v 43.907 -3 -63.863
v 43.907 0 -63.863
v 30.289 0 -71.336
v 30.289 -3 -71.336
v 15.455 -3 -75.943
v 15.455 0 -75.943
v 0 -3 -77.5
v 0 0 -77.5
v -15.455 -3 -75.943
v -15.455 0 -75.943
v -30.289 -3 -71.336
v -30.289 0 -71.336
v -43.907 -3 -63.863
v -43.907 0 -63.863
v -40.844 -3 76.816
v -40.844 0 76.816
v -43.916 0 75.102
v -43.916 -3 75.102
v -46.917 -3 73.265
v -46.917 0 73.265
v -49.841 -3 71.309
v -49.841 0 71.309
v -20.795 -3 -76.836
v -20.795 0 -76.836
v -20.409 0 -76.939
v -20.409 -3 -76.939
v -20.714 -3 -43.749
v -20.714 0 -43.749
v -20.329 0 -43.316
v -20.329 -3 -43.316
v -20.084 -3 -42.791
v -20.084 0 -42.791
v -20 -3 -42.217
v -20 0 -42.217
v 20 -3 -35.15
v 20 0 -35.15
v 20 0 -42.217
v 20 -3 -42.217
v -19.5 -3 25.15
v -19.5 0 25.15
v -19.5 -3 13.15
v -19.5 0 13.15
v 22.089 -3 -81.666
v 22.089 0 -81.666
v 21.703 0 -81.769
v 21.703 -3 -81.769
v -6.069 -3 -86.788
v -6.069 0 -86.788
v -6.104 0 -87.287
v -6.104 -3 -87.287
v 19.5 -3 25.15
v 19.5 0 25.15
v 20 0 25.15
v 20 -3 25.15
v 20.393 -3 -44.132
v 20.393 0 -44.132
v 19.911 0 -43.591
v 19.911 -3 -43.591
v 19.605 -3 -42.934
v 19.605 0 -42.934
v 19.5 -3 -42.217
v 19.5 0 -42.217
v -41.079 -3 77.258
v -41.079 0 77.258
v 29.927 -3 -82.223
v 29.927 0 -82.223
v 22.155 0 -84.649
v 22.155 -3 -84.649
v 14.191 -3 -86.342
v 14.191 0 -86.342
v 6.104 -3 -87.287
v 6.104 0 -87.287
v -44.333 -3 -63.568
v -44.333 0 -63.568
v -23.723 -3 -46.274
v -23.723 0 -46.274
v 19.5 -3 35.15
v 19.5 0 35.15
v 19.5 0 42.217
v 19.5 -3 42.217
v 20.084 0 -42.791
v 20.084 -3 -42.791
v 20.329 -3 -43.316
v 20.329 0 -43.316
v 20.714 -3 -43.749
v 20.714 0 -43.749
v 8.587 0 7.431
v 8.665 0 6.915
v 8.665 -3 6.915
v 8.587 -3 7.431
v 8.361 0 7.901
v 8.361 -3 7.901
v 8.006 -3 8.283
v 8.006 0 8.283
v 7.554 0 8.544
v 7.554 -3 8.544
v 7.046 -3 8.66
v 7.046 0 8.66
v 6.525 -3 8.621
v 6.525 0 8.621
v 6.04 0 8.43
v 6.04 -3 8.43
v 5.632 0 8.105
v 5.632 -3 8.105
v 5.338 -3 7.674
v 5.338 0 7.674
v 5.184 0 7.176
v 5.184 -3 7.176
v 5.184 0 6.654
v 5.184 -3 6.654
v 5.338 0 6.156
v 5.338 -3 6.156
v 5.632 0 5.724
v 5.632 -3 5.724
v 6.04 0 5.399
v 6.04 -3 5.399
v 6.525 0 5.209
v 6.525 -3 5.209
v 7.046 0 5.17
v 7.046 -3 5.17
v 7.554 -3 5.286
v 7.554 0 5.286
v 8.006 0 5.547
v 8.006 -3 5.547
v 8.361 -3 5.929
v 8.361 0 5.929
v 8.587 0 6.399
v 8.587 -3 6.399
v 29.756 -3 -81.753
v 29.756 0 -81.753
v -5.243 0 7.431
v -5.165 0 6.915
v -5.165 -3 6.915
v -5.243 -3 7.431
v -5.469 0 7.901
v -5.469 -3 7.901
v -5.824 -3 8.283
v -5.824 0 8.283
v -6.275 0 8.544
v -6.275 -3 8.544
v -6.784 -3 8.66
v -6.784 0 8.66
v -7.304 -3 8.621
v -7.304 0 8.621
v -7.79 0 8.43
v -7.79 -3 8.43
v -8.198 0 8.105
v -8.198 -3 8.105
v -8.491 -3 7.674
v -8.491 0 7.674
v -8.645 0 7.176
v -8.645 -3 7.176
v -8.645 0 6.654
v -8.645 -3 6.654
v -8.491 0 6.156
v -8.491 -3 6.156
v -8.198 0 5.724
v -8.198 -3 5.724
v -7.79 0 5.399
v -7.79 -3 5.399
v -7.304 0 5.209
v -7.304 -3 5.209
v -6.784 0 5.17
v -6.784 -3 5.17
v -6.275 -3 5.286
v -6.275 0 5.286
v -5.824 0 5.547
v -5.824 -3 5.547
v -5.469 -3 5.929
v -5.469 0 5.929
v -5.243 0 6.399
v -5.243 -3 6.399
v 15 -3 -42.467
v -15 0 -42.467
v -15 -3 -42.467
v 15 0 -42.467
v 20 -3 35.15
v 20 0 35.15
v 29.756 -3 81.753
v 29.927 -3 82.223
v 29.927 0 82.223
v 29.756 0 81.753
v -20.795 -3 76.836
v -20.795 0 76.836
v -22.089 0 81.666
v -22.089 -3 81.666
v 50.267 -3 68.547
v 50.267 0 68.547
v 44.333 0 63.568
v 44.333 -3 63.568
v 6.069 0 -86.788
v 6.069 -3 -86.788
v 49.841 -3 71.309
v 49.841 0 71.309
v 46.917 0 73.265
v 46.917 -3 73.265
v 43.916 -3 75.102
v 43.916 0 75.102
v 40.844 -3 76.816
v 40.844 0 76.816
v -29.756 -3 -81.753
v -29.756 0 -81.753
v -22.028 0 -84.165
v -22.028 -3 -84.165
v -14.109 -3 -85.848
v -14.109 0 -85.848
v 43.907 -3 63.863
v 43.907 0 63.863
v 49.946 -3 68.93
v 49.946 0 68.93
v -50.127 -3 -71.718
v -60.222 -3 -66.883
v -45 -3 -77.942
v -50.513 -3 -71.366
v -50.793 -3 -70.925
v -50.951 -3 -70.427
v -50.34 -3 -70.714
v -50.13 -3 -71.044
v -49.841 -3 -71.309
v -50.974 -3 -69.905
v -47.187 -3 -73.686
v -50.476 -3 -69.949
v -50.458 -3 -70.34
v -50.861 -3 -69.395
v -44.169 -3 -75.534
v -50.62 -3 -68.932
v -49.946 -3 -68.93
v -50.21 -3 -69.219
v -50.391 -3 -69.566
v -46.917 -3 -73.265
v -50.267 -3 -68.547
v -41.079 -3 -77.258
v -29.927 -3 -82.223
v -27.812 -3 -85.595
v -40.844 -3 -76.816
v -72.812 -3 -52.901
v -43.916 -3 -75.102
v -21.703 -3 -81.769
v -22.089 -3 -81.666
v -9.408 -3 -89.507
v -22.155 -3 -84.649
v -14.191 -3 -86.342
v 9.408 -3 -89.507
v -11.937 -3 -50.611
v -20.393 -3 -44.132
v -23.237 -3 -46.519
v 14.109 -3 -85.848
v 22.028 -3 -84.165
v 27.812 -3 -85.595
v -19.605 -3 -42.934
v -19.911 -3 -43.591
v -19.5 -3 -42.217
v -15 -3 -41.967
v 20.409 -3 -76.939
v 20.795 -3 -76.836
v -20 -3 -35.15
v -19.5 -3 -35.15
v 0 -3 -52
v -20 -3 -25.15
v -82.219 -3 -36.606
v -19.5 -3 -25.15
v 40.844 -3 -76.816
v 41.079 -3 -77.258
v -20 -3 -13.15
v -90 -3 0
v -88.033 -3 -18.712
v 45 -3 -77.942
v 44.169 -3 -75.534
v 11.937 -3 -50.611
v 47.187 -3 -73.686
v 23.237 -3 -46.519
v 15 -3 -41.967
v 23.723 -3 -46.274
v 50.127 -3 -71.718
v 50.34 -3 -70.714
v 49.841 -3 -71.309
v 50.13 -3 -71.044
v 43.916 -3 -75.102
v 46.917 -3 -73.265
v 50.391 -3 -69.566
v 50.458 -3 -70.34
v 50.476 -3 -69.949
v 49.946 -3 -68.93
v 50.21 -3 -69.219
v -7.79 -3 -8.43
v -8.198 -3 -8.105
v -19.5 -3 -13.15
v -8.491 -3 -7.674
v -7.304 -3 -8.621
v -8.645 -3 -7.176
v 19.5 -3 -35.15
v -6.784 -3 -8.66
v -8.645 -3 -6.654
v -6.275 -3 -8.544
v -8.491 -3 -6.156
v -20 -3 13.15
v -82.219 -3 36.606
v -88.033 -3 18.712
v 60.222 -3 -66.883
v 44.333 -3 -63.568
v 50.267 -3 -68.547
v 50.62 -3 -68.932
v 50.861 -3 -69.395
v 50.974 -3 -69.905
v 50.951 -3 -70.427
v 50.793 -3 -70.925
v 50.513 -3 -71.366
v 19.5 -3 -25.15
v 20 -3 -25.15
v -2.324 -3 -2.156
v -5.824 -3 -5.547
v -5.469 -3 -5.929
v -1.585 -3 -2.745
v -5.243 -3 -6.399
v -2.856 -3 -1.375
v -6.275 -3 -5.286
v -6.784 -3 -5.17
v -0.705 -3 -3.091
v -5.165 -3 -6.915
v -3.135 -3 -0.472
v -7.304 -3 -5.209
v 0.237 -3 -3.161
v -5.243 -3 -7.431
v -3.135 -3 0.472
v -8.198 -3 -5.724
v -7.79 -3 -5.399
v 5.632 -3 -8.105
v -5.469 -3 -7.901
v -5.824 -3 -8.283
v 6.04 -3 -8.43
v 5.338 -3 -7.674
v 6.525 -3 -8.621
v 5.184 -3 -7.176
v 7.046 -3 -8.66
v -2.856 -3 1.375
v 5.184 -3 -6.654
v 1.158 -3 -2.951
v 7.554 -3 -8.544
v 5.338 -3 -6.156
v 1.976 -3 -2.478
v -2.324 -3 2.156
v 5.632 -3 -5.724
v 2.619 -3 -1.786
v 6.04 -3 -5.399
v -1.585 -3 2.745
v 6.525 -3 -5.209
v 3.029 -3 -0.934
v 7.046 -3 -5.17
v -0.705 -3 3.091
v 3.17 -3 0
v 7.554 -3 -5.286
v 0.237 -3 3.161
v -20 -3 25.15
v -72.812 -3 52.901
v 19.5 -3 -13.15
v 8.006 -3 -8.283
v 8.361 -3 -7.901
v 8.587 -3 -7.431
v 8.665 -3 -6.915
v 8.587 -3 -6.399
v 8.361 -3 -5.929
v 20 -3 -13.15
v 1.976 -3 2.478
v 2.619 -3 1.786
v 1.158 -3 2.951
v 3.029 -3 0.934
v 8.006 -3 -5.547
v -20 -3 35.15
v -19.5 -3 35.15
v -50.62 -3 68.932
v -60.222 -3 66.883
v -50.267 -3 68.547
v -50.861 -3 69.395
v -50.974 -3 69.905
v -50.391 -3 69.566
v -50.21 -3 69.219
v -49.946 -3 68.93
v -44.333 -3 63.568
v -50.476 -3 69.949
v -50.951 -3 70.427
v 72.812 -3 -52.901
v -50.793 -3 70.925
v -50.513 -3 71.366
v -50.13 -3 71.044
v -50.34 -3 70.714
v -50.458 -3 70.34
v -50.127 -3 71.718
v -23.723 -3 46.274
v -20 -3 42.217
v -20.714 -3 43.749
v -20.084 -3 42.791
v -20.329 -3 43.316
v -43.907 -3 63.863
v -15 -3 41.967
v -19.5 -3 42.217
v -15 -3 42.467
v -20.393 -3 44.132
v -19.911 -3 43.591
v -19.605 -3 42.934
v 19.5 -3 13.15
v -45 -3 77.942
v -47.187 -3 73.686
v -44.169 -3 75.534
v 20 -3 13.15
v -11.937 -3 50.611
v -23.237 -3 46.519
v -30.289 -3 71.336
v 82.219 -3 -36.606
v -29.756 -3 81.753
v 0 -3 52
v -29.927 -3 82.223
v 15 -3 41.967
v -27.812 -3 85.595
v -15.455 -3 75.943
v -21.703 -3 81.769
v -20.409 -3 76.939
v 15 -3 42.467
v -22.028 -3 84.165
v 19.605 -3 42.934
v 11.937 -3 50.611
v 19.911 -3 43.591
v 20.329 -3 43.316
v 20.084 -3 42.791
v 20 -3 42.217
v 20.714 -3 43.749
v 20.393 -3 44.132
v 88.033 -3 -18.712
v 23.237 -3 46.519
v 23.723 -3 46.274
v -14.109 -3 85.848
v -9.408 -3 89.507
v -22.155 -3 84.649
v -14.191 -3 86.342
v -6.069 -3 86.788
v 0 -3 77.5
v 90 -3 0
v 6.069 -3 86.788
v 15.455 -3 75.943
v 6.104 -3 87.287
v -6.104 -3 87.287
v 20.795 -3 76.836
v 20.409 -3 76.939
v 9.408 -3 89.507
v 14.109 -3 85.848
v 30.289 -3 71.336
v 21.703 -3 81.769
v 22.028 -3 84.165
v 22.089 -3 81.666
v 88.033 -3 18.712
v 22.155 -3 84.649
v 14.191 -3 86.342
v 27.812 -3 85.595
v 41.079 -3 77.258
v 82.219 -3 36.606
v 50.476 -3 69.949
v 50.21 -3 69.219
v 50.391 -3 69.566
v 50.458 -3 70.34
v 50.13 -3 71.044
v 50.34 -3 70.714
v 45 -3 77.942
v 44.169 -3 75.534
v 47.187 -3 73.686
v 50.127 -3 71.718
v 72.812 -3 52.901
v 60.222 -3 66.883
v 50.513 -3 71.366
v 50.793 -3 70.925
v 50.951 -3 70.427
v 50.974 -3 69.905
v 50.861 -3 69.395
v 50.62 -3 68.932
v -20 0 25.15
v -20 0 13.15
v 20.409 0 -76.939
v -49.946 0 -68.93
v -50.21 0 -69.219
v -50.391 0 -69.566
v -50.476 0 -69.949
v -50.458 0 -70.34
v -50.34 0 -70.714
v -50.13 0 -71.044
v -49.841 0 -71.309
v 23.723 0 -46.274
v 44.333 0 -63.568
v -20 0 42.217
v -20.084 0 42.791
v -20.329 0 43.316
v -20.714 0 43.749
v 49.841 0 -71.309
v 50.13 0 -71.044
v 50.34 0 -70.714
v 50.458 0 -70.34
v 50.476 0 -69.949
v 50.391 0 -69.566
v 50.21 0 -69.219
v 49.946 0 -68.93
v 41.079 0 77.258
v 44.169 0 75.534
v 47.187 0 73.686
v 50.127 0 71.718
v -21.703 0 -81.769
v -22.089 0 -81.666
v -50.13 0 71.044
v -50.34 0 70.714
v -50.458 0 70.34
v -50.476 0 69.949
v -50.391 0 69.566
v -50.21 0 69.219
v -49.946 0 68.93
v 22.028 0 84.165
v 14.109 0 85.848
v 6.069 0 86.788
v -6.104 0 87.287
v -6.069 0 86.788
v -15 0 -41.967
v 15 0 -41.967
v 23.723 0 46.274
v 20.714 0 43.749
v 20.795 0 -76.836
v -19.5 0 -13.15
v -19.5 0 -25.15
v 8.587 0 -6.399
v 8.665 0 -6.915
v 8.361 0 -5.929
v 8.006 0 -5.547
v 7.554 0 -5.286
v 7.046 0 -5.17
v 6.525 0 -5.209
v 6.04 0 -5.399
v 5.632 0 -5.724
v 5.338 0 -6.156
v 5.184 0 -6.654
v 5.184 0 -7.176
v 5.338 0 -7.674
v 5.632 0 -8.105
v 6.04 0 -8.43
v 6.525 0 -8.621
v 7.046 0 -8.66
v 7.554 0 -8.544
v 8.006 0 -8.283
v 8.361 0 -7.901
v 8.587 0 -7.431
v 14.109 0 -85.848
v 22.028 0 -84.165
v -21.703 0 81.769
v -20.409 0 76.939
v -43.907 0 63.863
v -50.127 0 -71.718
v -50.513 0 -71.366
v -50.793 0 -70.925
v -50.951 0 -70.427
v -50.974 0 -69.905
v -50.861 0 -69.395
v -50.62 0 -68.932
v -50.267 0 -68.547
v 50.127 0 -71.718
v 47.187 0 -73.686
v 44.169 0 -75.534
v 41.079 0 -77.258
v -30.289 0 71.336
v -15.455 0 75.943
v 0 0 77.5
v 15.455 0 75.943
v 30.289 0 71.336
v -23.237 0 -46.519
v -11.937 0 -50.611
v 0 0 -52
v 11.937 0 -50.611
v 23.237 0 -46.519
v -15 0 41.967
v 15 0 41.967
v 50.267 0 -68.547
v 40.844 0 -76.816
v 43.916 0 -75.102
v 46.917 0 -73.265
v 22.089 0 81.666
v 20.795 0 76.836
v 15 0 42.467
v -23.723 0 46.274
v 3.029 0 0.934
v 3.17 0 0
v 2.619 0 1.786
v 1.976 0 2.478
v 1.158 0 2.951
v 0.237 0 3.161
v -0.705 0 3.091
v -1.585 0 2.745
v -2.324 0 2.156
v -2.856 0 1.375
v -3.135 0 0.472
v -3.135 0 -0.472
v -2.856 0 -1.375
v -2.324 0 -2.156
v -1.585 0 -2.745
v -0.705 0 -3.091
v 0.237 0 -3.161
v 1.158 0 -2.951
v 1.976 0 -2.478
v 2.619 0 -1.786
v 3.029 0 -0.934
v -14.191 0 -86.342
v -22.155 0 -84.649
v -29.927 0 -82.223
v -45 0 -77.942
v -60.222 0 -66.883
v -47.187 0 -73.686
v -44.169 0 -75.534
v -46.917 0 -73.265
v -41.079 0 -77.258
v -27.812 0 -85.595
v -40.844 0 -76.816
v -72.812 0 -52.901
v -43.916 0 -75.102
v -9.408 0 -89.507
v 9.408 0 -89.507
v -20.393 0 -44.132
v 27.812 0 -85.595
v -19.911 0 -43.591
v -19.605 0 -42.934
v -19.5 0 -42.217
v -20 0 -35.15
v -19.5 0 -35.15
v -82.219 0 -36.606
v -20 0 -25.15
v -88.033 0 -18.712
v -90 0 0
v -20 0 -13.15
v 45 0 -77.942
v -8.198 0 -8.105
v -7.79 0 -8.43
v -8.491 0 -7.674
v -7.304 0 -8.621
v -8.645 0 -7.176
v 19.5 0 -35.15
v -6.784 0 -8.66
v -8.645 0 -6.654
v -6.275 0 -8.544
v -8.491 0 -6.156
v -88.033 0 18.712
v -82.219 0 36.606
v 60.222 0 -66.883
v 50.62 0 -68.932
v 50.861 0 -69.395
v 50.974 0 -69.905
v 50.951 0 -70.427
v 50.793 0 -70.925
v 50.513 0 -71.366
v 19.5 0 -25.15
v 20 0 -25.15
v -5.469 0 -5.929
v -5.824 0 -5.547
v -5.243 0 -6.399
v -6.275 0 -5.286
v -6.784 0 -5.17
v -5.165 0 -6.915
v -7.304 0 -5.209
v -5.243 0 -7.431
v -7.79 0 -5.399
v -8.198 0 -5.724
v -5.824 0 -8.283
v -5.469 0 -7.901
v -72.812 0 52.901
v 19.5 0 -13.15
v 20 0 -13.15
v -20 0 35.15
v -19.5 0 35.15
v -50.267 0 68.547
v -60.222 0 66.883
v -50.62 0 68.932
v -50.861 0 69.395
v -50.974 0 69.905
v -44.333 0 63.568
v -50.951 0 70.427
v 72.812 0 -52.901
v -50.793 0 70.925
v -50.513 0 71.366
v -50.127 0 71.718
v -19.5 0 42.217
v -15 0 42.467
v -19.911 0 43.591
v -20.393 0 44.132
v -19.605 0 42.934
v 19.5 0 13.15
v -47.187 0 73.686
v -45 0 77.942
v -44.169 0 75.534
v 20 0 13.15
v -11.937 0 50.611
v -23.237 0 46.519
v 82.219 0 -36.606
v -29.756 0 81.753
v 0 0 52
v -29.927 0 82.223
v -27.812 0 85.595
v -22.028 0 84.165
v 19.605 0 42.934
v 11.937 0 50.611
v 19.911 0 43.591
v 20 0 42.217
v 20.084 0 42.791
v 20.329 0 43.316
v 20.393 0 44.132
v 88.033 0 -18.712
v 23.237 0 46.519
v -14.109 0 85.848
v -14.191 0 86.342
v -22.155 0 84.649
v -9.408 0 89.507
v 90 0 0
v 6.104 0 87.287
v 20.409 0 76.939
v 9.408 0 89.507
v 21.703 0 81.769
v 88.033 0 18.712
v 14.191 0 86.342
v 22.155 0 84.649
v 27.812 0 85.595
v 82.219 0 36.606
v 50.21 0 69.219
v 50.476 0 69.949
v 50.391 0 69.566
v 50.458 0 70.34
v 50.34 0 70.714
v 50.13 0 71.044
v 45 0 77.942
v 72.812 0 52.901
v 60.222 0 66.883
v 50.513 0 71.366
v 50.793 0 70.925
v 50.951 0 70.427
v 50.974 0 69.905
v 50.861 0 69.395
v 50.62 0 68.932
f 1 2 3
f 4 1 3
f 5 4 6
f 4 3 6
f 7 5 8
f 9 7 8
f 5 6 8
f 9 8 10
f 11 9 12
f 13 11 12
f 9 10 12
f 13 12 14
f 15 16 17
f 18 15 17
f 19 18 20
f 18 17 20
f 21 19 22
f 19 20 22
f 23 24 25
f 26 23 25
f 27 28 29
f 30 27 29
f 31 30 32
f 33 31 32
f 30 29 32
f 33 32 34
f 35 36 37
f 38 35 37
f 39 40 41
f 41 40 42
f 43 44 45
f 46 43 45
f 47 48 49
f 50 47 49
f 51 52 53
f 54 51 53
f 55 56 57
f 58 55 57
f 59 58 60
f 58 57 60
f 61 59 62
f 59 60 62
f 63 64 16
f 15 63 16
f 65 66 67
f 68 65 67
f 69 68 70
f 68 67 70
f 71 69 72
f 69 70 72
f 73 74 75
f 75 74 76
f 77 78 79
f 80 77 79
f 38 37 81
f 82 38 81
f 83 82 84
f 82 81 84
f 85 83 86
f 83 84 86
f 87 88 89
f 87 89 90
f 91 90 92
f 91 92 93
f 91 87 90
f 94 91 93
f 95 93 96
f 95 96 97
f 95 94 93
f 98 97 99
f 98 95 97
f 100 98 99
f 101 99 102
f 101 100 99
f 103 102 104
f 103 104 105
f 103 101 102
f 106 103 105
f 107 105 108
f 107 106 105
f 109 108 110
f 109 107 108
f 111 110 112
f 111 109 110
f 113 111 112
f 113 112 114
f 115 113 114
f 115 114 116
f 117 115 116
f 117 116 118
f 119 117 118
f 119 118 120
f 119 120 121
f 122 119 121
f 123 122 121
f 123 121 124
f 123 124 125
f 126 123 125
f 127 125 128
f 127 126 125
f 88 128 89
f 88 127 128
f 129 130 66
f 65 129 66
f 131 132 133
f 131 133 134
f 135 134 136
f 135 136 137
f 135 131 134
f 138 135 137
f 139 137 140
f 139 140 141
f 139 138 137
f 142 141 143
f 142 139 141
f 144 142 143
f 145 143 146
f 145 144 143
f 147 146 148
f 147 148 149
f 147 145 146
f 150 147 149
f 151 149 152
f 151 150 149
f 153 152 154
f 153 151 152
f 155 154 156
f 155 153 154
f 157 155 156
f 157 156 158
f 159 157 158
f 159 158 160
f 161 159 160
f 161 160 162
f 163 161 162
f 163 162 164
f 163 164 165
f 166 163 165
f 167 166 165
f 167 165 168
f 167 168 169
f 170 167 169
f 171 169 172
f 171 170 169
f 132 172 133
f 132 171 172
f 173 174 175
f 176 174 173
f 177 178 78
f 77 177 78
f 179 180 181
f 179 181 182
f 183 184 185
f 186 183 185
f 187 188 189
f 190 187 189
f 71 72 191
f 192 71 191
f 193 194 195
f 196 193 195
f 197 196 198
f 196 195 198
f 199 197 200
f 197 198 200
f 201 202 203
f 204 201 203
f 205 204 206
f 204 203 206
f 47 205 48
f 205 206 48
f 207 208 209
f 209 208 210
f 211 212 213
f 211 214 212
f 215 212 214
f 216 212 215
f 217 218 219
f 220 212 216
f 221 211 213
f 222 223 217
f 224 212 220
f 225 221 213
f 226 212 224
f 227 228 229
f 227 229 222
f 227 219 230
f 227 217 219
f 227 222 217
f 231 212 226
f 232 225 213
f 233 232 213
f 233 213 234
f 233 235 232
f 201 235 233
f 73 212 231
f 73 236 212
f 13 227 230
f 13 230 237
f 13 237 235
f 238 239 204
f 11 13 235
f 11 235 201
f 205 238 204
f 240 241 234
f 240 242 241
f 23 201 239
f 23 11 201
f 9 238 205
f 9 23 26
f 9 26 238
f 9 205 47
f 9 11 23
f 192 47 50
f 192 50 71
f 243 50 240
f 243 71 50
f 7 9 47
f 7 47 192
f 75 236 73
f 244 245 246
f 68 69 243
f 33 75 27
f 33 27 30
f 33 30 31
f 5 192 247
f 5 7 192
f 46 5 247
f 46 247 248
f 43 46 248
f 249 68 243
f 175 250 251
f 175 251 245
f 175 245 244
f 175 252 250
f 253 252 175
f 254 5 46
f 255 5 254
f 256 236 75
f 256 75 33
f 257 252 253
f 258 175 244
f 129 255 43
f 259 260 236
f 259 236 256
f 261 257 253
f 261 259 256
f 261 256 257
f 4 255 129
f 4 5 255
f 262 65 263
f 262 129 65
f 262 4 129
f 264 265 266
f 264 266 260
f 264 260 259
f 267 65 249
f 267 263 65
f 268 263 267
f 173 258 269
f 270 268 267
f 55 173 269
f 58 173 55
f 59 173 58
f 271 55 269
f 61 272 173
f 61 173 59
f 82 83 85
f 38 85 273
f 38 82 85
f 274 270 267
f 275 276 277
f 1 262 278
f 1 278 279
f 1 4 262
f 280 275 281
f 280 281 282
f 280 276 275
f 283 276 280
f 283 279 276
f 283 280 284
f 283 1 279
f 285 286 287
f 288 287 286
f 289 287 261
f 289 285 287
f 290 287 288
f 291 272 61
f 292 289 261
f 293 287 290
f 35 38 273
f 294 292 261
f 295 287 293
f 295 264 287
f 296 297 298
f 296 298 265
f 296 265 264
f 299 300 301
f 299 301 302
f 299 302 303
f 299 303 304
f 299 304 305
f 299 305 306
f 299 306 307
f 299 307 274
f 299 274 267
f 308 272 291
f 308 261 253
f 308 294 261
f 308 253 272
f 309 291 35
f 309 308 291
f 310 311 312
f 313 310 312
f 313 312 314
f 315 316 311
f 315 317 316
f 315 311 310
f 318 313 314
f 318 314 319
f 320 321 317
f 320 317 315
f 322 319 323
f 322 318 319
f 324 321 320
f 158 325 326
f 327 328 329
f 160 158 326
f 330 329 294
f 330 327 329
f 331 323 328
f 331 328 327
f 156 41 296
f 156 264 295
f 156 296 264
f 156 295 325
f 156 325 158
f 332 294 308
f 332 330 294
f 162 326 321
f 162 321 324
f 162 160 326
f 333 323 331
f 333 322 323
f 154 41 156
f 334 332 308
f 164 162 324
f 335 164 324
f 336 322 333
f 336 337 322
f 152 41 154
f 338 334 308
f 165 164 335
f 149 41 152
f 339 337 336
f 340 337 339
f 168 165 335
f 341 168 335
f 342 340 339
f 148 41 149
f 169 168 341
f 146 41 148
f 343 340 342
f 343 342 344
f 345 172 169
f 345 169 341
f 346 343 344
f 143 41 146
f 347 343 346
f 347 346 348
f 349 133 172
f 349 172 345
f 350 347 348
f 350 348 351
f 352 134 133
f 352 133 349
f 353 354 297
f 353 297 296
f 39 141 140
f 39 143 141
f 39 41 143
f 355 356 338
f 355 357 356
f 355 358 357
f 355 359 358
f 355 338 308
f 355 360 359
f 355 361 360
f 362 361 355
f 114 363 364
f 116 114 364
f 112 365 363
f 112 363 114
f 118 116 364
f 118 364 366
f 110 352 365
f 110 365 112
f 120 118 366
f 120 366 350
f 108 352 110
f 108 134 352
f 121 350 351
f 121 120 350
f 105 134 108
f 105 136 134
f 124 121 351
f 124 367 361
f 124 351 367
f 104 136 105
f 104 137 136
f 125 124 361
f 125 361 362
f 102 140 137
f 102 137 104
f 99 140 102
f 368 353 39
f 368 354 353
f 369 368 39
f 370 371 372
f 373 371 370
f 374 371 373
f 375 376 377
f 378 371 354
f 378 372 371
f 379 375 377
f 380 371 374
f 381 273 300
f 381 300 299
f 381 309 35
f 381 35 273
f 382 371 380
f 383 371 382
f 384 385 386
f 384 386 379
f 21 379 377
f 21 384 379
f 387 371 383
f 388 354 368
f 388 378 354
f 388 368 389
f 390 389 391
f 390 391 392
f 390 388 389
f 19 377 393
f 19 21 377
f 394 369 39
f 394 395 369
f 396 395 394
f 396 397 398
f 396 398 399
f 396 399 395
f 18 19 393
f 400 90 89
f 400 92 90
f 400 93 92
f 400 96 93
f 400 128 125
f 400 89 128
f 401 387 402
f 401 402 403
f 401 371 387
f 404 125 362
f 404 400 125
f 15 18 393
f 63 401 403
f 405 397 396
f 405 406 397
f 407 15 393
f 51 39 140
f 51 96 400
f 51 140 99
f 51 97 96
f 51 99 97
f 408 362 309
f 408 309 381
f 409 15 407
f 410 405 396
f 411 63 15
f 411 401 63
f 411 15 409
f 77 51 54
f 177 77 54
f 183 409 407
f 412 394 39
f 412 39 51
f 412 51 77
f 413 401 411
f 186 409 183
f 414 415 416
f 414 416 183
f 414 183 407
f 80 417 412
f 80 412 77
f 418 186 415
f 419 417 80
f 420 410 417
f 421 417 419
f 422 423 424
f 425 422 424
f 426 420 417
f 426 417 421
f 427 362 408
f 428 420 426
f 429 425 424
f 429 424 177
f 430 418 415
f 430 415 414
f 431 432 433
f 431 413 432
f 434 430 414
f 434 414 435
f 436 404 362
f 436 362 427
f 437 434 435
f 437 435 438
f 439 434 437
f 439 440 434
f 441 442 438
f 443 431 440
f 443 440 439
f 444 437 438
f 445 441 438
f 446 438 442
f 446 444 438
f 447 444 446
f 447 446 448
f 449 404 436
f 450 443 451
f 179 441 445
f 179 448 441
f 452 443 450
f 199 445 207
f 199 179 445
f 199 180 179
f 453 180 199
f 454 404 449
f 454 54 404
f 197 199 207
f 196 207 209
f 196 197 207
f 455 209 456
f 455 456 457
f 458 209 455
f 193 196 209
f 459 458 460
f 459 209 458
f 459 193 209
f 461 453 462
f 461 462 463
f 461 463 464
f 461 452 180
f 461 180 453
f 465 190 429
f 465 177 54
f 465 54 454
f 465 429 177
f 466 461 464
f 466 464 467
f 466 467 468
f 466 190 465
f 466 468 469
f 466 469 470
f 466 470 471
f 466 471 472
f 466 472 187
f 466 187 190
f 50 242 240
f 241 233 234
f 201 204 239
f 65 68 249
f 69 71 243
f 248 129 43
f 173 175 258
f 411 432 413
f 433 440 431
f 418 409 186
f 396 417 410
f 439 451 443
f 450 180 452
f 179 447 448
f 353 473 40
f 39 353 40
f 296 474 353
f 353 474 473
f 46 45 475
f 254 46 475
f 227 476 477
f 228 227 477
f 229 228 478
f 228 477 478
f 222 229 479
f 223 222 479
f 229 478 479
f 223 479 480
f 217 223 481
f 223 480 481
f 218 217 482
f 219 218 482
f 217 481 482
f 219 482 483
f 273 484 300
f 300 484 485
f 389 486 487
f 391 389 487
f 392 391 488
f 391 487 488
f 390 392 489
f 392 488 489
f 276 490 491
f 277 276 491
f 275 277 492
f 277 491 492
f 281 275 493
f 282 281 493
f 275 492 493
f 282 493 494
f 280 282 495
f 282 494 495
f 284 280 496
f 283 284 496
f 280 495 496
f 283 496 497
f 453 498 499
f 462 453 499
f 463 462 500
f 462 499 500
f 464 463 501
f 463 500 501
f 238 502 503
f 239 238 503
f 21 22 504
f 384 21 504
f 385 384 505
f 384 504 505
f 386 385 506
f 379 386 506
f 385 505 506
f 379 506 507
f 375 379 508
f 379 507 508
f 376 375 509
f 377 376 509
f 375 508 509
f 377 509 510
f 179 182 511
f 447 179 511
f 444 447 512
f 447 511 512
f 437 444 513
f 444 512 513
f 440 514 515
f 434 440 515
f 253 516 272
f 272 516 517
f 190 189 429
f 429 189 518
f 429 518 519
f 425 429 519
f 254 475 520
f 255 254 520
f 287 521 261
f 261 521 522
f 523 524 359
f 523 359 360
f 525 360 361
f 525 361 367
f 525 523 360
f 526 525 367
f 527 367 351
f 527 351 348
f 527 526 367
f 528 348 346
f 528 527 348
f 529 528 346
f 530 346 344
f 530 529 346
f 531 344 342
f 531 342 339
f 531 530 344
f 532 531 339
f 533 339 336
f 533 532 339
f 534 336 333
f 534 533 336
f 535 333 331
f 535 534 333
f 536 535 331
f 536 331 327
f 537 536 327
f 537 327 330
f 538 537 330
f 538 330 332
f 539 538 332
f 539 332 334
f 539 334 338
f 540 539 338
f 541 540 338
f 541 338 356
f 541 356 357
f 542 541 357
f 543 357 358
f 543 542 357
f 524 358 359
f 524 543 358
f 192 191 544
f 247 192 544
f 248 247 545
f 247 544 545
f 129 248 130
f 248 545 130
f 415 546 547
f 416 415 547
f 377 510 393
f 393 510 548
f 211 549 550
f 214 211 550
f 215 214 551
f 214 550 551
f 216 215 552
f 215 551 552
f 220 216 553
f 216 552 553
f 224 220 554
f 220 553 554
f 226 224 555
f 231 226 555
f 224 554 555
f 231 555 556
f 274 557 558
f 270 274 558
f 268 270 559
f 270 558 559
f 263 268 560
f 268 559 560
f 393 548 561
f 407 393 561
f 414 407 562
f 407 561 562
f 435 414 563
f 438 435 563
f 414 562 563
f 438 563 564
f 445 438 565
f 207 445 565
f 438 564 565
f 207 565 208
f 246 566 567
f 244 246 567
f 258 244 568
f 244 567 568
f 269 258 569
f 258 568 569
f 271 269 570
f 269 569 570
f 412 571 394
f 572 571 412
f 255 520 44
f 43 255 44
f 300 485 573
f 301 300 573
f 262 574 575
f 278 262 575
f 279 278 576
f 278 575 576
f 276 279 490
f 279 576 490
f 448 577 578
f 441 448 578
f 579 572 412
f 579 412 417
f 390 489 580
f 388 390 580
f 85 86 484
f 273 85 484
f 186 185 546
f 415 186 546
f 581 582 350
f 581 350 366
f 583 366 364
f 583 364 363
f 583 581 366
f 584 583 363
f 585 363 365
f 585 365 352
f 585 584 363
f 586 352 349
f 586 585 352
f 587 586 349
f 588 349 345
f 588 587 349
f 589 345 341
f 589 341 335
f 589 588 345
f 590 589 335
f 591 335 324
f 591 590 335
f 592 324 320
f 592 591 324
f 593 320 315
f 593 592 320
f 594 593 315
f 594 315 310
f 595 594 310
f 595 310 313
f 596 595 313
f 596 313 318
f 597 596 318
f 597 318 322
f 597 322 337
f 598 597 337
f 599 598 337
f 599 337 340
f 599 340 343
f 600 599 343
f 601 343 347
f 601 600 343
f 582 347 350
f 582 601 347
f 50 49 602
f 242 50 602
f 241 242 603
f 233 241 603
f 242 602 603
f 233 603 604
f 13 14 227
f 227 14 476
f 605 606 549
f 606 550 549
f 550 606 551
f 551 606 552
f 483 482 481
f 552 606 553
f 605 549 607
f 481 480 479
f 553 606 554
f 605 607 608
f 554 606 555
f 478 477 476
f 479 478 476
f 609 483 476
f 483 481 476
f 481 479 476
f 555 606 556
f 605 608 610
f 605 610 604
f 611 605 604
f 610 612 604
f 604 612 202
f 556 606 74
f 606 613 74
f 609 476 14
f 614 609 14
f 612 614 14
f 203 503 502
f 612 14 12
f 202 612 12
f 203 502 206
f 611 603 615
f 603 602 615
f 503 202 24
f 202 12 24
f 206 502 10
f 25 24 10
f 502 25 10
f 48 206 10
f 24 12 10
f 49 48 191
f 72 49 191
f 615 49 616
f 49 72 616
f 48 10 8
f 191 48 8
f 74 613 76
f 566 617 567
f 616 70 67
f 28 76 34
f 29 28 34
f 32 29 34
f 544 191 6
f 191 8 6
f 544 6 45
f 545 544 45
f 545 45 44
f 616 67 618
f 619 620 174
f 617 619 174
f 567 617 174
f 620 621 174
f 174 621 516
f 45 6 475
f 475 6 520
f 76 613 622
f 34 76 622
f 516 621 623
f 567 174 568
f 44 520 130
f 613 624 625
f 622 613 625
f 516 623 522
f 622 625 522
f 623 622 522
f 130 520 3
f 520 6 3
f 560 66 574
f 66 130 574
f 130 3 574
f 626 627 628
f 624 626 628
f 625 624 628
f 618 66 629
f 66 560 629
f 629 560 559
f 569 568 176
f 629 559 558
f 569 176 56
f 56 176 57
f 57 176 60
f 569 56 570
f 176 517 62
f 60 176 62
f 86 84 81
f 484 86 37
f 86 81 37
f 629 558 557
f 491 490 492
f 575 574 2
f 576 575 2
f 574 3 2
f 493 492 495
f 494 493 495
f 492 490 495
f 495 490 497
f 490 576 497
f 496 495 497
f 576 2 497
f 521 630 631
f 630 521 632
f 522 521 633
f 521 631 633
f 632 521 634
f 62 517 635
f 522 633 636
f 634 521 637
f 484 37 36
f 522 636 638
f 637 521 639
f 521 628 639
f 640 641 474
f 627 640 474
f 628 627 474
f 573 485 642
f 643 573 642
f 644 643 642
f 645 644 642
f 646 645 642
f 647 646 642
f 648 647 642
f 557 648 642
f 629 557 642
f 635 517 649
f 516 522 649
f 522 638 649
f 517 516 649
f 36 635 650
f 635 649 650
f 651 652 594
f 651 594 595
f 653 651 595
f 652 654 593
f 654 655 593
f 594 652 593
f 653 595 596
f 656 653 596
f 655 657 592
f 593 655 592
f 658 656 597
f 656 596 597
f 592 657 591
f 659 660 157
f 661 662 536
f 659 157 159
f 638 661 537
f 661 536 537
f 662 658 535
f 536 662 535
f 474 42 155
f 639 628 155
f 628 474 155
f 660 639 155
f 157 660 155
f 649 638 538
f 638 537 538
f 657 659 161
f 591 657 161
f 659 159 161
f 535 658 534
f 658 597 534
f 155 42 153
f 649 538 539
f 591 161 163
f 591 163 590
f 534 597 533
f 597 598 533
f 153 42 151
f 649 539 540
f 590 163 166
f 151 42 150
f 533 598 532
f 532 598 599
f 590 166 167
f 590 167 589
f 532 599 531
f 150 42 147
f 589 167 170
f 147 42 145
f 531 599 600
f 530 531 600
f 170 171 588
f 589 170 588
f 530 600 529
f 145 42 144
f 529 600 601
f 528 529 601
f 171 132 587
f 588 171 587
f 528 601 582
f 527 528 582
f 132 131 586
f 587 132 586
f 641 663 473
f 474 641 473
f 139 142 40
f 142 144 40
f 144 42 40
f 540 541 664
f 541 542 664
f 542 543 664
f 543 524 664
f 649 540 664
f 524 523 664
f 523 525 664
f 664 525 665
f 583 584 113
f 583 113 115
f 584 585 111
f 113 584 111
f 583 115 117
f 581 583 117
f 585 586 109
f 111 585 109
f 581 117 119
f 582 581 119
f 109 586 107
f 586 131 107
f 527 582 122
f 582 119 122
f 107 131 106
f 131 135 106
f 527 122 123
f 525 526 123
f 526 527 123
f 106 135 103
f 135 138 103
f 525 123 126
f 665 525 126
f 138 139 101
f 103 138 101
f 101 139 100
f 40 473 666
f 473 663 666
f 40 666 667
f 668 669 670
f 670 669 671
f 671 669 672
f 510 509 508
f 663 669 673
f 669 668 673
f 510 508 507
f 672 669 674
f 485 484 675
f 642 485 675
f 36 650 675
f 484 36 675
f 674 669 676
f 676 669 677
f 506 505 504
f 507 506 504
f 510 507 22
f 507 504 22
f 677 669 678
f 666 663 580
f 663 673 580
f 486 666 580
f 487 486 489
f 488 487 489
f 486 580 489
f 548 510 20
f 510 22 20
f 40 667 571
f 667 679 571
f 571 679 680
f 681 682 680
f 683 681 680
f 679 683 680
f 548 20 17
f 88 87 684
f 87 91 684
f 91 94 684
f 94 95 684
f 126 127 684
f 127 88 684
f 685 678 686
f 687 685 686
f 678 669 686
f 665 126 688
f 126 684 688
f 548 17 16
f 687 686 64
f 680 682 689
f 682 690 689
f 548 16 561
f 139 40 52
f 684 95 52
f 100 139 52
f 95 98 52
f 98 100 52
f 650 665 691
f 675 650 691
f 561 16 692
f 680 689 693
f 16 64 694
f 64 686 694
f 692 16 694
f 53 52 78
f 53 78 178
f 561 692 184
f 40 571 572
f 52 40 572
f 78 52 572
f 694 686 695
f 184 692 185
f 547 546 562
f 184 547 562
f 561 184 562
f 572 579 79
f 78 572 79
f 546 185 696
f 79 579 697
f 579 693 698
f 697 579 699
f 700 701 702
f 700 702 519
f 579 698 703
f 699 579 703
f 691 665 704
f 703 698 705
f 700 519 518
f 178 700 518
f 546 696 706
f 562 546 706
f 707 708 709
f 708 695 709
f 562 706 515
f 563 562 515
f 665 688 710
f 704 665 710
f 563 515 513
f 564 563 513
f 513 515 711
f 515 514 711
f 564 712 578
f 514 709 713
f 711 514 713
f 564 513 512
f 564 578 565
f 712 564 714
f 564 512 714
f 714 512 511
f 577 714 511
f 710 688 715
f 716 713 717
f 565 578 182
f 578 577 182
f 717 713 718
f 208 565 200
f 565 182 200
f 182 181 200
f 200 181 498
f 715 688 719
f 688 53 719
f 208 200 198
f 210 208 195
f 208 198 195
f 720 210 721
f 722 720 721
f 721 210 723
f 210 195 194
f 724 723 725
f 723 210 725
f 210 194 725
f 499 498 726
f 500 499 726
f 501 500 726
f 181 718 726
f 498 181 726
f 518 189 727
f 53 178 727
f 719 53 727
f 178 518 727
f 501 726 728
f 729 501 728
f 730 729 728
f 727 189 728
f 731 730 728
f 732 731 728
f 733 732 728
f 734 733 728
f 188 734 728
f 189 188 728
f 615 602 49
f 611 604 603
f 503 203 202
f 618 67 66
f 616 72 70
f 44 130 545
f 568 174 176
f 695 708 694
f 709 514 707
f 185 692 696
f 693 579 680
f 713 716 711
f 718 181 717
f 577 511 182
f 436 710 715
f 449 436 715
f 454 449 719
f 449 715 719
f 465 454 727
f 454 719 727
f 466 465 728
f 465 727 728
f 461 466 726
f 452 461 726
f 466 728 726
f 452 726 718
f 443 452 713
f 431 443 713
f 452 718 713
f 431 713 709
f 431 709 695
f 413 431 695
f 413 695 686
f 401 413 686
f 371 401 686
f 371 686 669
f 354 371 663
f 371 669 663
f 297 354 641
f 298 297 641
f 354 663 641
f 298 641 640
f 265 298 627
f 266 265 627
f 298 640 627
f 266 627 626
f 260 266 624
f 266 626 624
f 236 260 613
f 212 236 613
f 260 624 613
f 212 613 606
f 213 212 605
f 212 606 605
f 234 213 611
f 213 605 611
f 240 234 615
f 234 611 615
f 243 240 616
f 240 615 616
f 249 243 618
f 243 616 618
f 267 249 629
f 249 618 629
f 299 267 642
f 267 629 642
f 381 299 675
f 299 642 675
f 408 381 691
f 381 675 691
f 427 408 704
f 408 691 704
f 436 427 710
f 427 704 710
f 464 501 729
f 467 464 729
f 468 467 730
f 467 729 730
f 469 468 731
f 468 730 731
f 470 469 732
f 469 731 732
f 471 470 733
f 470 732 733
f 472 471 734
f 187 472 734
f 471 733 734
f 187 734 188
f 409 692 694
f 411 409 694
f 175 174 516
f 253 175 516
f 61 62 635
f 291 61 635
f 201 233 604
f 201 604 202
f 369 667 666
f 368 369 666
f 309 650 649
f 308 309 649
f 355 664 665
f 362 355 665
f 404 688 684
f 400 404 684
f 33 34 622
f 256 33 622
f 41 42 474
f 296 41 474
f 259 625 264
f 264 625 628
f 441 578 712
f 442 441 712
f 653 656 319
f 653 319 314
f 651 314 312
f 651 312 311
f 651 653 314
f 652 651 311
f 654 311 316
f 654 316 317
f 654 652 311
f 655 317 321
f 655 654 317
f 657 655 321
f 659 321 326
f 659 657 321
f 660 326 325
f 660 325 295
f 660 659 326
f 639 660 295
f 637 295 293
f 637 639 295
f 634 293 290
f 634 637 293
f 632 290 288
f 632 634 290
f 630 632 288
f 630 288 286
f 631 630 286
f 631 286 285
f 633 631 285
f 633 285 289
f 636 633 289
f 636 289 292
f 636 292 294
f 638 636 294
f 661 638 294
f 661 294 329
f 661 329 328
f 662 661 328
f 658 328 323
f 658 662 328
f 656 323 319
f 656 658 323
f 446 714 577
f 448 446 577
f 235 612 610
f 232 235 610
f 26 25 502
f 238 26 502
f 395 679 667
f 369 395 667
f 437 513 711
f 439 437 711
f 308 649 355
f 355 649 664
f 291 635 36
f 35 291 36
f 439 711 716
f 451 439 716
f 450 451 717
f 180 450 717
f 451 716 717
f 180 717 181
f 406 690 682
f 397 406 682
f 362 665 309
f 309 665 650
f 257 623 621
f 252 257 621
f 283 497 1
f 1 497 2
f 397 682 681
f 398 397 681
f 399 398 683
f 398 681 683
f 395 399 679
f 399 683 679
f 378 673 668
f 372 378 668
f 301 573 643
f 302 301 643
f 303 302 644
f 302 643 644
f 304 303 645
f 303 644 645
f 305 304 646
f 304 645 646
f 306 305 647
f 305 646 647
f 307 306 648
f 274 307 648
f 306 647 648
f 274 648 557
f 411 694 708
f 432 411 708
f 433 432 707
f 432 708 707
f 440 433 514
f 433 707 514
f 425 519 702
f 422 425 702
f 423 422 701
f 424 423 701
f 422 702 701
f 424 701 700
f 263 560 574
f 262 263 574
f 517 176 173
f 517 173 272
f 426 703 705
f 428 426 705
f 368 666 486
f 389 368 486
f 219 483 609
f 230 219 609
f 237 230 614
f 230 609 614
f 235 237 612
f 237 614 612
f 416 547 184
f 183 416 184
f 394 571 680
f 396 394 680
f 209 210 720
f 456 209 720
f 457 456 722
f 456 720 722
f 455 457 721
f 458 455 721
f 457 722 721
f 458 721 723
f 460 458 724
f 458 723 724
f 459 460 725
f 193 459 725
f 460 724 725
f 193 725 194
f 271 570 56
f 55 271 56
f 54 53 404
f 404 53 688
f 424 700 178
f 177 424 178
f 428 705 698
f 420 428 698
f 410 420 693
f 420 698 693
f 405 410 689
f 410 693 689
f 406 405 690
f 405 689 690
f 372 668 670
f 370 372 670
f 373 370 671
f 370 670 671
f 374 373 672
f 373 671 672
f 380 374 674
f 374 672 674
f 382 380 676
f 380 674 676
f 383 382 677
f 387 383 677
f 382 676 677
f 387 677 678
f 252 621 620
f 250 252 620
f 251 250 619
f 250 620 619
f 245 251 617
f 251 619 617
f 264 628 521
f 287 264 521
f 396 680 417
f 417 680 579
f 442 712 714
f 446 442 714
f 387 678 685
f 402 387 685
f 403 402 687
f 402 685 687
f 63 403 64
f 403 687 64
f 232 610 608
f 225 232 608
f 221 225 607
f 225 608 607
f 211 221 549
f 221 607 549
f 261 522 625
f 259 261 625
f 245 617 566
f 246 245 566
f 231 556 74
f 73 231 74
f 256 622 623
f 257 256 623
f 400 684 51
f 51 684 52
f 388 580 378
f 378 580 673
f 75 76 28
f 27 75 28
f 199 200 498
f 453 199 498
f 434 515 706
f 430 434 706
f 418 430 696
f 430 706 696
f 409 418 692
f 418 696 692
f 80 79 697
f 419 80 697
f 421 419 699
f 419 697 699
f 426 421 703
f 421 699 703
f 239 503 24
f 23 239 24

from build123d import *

# Parameters (mm, degrees)
F0_R     = 90
F0_R_2   = 1.75
F0_W     = 30
F0_H     = 0.5
F0_R_3   = 3.17
F1_DEPTH = 3


with BuildPart() as f1:
    # F0 (on Front) → F1 (new body)
    with BuildSketch(Plane.XZ):
        Circle(F0_R)
        with BuildLine():
            Line((-29.926763, -82.223104), (-29.755752, -81.753258))
            ThreePointArc((-29.755752, -81.753258), (-18.088317, -85.098841), (-6.068813, -86.788072))
            Line((-6.068813, -86.788072), (-6.103691, -87.286854))
            ThreePointArc((-6.103691, -87.286854), (-18.192273, -85.587915), (-29.926763, -82.223104))
        make_face(mode=Mode.SUBTRACT)
        Polygon((-20.795181, -76.835932), (-20.408811, -76.93946), (-21.702906, -81.769089), (-22.089276, -81.665561), align=None, mode=Mode.SUBTRACT)
        Polygon((-19.5, -25.15), (-20, -25.15), (-20, -15.15), (-20, -13.15), (-19.5, -13.15), (-19.5, -15.15), align=None, mode=Mode.SUBTRACT)
        with Locations((-6.914797, -6.914797)):
            Circle(F0_R_2, mode=Mode.SUBTRACT)
        with BuildLine():
            Line((6.103691, -87.286854), (6.068813, -86.788072))
            ThreePointArc((6.068813, -86.788072), (18.088317, -85.098841), (29.755752, -81.753258))
            Line((29.755752, -81.753258), (29.926763, -82.223104))
            ThreePointArc((29.926763, -82.223104), (18.192273, -85.587915), (6.103691, -87.286854))
        make_face(mode=Mode.SUBTRACT)
        Polygon((22.089276, -81.665561), (21.702906, -81.769089), (20.408811, -76.93946), (20.795181, -76.835932), align=None, mode=Mode.SUBTRACT)
        with BuildLine():
            ThreePointArc((-41.078762, -77.257914), (-45.686982, -74.625396), (-50.127129, -71.718345))
            ThreePointArc((-50.127129, -71.718345), (-50.979425, -70.167154), (-50.266941, -68.546979))
            Line((-50.266941, -68.546979), (-44.332839, -63.567676))
            Line((-44.332839, -63.567676), (-23.722514, -46.27356))
            Line((-23.722514, -46.27356), (-20.714425, -43.749474))
            ThreePointArc((-20.714425, -43.749474), (-20.187384, -43.062621), (-20, -42.217385))
            Line((-20, -42.217385), (-20, -35.15))
            Line((-20, -35.15), (-19.5, -35.15))
            Line((-19.5, -35.15), (-19.5, -42.217385))
            ThreePointArc((-19.5, -42.217385), (-19.734231, -43.27393), (-20.393031, -44.132496))
            Line((-20.393031, -44.132496), (-23.237294, -46.519116))
            ThreePointArc((-23.237294, -46.519116), (0, -52), (23.237294, -46.519116))
            Line((23.237294, -46.519116), (20.393031, -44.132496))
            ThreePointArc((20.393031, -44.132496), (19.734231, -43.27393), (19.5, -42.217385))
            Line((19.5, -42.217385), (19.5, -35.15))
            Line((19.5, -35.15), (20, -35.15))
            Line((20, -35.15), (20, -42.217385))
            ThreePointArc((20, -42.217385), (20.187384, -43.062621), (20.714425, -43.749474))
            Line((20.714425, -43.749474), (23.722514, -46.27356))
            Line((23.722514, -46.27356), (44.332839, -63.567676))
            Line((44.332839, -63.567676), (50.266941, -68.546979))
            ThreePointArc((50.266941, -68.546979), (50.979425, -70.167154), (50.127129, -71.718345))
            ThreePointArc((50.127129, -71.718345), (45.686982, -74.625396), (41.078762, -77.257914))
            Line((41.078762, -77.257914), (40.844026, -76.816441))
            ThreePointArc((40.844026, -76.816441), (45.425914, -74.198965), (49.840688, -71.308525))
            ThreePointArc((49.840688, -71.308525), (50.47991, -70.145133), (49.945547, -68.930001))
            Line((49.945547, -68.930001), (43.906667, -63.862779))
            ThreePointArc((43.906667, -63.862779), (0, -77.5), (-43.906667, -63.862779))
            Line((-43.906667, -63.862779), (-49.945547, -68.930001))
            ThreePointArc((-49.945547, -68.930001), (-50.47991, -70.145133), (-49.840688, -71.308525))
            ThreePointArc((-49.840688, -71.308525), (-45.425914, -74.198965), (-40.844026, -76.816441))
            Line((-40.844026, -76.816441), (-41.078762, -77.257914))
        make_face(mode=Mode.SUBTRACT)
        with Locations((0, -42.217385)):
            Rectangle(F0_W, F0_H, mode=Mode.SUBTRACT)
        Polygon((20, -13.15), (20, -15.15), (20, -25.15), (19.5, -25.15), (19.5, -15.15), (19.5, -13.15), align=None, mode=Mode.SUBTRACT)
        with Locations((6.914797, -6.914797)):
            Circle(F0_R_2, mode=Mode.SUBTRACT)
        with Locations((-6.914797, 6.914797)):
            Circle(F0_R_2, mode=Mode.SUBTRACT)
        Polygon((-19.5, 25.15), (-19.5, 15.15), (-19.5, 13.15), (-20, 13.15), (-20, 15.15), (-20, 25.15), align=None, mode=Mode.SUBTRACT)
        Polygon((-21.702906, 81.769089), (-20.408811, 76.93946), (-20.795181, 76.835932), (-22.089276, 81.665561), align=None, mode=Mode.SUBTRACT)
        with BuildLine():
            Line((-6.103691, 87.286854), (-6.068813, 86.788072))
            ThreePointArc((-6.068813, 86.788072), (-18.088317, 85.098841), (-29.755752, 81.753258))
            Line((-29.755752, 81.753258), (-29.926763, 82.223104))
            ThreePointArc((-29.926763, 82.223104), (-18.192273, 85.587915), (-6.103691, 87.286854))
        make_face(mode=Mode.SUBTRACT)
        Circle(F0_R_3, mode=Mode.SUBTRACT)
        with Locations((6.914797, 6.914797)):
            Circle(F0_R_2, mode=Mode.SUBTRACT)
        Polygon((20, 25.15), (20, 15.15), (20, 13.15), (19.5, 13.15), (19.5, 15.15), (19.5, 25.15), align=None, mode=Mode.SUBTRACT)
        with Locations((0, 42.217385)):
            Rectangle(F0_W, F0_H, mode=Mode.SUBTRACT)
        with BuildLine():
            ThreePointArc((20.714425, 43.749474), (20.187384, 43.062621), (20, 42.217385))
            Line((20, 42.217385), (20, 35.15))
            Line((20, 35.15), (19.5, 35.15))
            Line((19.5, 35.15), (19.5, 42.217385))
            ThreePointArc((19.5, 42.217385), (19.734231, 43.27393), (20.393031, 44.132496))
            Line((20.393031, 44.132496), (23.237294, 46.519116))
            ThreePointArc((23.237294, 46.519116), (0, 52), (-23.237294, 46.519116))
            Line((-23.237294, 46.519116), (-20.393031, 44.132496))
            ThreePointArc((-20.393031, 44.132496), (-19.734231, 43.27393), (-19.5, 42.217385))
            Line((-19.5, 42.217385), (-19.5, 35.15))
            Line((-19.5, 35.15), (-20, 35.15))
            Line((-20, 35.15), (-20, 42.217385))
            ThreePointArc((-20, 42.217385), (-20.187384, 43.062621), (-20.714425, 43.749474))
            Line((-20.714425, 43.749474), (-23.722514, 46.27356))
            Line((-23.722514, 46.27356), (-44.332839, 63.567676))
            Line((-44.332839, 63.567676), (-50.266941, 68.546979))
            ThreePointArc((-50.266941, 68.546979), (-50.979425, 70.167154), (-50.127129, 71.718345))
            ThreePointArc((-50.127129, 71.718345), (-45.686982, 74.625396), (-41.078762, 77.257914))
            Line((-41.078762, 77.257914), (-40.844026, 76.816441))
            ThreePointArc((-40.844026, 76.816441), (-45.425914, 74.198965), (-49.840688, 71.308525))
            ThreePointArc((-49.840688, 71.308525), (-50.47991, 70.145133), (-49.945547, 68.930001))
            Line((-49.945547, 68.930001), (-43.906667, 63.862779))
            ThreePointArc((-43.906667, 63.862779), (0, 77.5), (43.906667, 63.862779))
            Line((43.906667, 63.862779), (49.945547, 68.930001))
            ThreePointArc((49.945547, 68.930001), (50.47991, 70.145133), (49.840688, 71.308525))
            ThreePointArc((49.840688, 71.308525), (45.425914, 74.198965), (40.844026, 76.816441))
            Line((40.844026, 76.816441), (41.078762, 77.257914))
            ThreePointArc((41.078762, 77.257914), (45.686982, 74.625396), (50.127129, 71.718345))
            ThreePointArc((50.127129, 71.718345), (50.979425, 70.167154), (50.266941, 68.546979))
            Line((50.266941, 68.546979), (44.332839, 63.567676))
            Line((44.332839, 63.567676), (23.722514, 46.27356))
            Line((23.722514, 46.27356), (20.714425, 43.749474))
        make_face(mode=Mode.SUBTRACT)
        Polygon((20.795181, 76.835932), (20.408811, 76.93946), (21.702906, 81.769089), (22.089276, 81.665561), align=None, mode=Mode.SUBTRACT)
        with BuildLine():
            Line((29.926763, 82.223104), (29.755752, 81.753258))
            ThreePointArc((29.755752, 81.753258), (18.088317, 85.098841), (6.068813, 86.788072))
            Line((6.068813, 86.788072), (6.103691, 87.286854))
            ThreePointArc((6.103691, 87.286854), (18.192273, 85.587915), (29.926763, 82.223104))
        make_face(mode=Mode.SUBTRACT)
    extrude(amount=F1_DEPTH)


solid = f1.part
